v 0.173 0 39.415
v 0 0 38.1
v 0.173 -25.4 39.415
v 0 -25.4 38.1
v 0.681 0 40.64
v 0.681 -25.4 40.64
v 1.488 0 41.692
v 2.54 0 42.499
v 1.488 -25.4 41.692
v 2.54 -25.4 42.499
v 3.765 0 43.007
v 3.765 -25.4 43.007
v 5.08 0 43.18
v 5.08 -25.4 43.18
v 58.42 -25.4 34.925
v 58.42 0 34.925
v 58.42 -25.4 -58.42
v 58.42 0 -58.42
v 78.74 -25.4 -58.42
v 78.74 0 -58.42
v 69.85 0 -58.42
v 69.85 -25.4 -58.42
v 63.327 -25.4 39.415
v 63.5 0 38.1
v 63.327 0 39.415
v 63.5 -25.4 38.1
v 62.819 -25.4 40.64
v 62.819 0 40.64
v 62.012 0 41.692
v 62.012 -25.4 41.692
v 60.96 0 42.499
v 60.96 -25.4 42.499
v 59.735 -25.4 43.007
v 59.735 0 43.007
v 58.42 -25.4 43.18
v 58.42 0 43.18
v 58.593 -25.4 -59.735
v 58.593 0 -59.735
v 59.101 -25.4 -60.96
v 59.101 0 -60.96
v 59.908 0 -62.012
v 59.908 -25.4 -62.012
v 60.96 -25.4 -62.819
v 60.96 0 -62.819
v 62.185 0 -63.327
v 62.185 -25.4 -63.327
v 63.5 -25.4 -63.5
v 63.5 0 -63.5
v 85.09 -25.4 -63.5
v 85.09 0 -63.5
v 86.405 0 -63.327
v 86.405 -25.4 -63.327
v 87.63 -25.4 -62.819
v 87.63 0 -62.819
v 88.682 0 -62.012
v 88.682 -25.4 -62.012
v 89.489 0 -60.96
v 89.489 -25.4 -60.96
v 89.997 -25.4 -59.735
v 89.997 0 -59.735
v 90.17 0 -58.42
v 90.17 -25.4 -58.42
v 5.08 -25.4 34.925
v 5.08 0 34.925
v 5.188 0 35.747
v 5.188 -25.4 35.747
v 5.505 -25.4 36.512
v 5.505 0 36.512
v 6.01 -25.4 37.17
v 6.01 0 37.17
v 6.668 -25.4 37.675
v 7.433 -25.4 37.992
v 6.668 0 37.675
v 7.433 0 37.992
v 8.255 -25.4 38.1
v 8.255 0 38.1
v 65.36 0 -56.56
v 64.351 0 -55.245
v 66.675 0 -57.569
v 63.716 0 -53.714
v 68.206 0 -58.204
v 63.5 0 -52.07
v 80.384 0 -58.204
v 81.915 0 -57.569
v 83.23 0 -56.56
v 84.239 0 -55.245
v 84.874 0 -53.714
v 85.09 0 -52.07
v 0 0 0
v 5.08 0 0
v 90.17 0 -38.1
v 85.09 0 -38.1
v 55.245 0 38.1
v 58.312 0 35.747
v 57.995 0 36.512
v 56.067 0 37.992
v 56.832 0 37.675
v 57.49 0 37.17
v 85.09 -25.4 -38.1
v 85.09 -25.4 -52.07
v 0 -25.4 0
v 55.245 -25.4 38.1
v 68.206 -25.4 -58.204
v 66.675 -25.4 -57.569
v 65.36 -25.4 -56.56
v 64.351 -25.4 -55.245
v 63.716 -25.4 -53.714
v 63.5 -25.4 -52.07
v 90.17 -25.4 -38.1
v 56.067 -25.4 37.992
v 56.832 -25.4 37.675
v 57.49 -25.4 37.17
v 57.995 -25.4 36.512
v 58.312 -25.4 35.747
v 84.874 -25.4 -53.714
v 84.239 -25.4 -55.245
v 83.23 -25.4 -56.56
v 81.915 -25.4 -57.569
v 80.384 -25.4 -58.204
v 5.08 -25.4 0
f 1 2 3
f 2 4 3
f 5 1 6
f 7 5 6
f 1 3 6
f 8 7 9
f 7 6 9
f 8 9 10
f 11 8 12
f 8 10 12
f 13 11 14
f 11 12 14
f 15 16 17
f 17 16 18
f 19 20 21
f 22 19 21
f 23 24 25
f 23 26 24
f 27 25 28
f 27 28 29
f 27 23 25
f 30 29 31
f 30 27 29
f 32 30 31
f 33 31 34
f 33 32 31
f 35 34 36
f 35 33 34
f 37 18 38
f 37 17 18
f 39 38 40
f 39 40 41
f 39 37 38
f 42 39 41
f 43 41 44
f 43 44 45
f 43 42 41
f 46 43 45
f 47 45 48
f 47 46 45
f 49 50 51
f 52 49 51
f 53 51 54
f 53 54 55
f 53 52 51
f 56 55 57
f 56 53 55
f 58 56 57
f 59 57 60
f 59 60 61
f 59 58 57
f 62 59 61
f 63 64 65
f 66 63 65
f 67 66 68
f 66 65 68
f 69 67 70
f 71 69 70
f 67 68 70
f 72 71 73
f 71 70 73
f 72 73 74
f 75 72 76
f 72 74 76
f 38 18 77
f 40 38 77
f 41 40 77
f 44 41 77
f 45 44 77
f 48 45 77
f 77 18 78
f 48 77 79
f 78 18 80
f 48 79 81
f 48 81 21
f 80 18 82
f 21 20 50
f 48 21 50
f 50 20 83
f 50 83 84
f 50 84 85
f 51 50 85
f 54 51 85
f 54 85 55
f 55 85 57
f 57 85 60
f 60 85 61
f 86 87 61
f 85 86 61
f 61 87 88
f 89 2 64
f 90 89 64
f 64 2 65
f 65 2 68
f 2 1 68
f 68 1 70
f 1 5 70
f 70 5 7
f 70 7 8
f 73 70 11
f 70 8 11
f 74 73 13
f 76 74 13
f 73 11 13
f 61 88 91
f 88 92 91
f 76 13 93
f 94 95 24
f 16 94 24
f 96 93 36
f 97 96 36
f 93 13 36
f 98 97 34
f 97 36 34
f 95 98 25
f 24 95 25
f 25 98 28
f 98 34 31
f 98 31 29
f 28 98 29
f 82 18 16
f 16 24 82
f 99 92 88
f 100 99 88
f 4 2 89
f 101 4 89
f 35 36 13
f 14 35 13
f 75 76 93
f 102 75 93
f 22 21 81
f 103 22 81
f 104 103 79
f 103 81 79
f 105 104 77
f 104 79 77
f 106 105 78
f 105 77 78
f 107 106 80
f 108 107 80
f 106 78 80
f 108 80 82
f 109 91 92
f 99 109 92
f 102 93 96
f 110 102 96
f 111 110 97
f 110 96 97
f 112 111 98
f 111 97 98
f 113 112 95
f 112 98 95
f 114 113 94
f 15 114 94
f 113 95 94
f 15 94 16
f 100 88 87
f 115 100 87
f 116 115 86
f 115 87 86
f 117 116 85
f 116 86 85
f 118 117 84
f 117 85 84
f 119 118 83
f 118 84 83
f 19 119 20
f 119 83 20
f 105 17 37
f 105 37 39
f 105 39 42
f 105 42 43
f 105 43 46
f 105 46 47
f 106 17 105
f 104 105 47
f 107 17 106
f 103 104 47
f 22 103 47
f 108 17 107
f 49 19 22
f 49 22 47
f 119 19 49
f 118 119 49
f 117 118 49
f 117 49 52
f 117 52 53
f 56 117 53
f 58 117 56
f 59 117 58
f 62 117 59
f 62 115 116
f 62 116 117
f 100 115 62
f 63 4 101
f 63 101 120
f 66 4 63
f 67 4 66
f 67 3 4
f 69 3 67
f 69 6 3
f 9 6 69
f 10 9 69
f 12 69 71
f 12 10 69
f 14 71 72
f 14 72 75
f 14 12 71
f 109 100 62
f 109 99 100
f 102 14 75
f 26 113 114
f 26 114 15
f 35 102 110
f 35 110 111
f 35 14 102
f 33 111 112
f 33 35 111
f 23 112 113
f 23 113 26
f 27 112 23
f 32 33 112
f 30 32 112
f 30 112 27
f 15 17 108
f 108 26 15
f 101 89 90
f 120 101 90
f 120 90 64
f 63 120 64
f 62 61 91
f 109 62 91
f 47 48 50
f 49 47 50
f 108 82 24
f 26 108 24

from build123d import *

# Parameters (mm, degrees)
F1_DEPTH = 25.4
F2_R     = 5.08


with BuildPart() as f1:
    # F0 (on Front) → F1 (new body)
    with BuildSketch(Plane.XZ):
        with BuildLine():
            Line((0, 43.18), (0, 0))
            Line((0, 0), (5.08, 0))
            Line((5.08, 0), (5.08, 34.925))
            ThreePointArc((5.08, 34.925), (6.009936, 37.170064), (8.255, 38.1))
            Line((8.255, 38.1), (55.245, 38.1))
            ThreePointArc((55.245, 38.1), (57.490064, 37.170064), (58.42, 34.925))
            Line((58.42, 34.925), (58.42, -63.5))
            Line((58.42, -63.5), (90.17, -63.5))
            Line((90.17, -63.5), (90.17, -38.1))
            Line((90.17, -38.1), (85.09, -38.1))
            Line((85.09, -38.1), (85.09, -52.07))
            ThreePointArc((85.09, -52.07), (83.230128, -56.560128), (78.74, -58.42))
            Line((78.74, -58.42), (69.85, -58.42))
            ThreePointArc((69.85, -58.42), (65.359872, -56.560128), (63.5, -52.07))
            Line((63.5, -52.07), (63.5, 43.18))
            Line((63.5, 43.18), (0, 43.18))
        make_face()
    extrude(amount=F1_DEPTH)

    # F2
    f2_edges = [f1.edges().sort_by_distance(p)[0] for p in [
        (0, -12.7, 43.18),
        (63.5, -12.7, 43.18),
        (90.17, -12.7, -63.5),
        (58.42, -12.7, -63.5),
    ]]
    fillet(f2_edges, radius=F2_R)


solid = f1.part
